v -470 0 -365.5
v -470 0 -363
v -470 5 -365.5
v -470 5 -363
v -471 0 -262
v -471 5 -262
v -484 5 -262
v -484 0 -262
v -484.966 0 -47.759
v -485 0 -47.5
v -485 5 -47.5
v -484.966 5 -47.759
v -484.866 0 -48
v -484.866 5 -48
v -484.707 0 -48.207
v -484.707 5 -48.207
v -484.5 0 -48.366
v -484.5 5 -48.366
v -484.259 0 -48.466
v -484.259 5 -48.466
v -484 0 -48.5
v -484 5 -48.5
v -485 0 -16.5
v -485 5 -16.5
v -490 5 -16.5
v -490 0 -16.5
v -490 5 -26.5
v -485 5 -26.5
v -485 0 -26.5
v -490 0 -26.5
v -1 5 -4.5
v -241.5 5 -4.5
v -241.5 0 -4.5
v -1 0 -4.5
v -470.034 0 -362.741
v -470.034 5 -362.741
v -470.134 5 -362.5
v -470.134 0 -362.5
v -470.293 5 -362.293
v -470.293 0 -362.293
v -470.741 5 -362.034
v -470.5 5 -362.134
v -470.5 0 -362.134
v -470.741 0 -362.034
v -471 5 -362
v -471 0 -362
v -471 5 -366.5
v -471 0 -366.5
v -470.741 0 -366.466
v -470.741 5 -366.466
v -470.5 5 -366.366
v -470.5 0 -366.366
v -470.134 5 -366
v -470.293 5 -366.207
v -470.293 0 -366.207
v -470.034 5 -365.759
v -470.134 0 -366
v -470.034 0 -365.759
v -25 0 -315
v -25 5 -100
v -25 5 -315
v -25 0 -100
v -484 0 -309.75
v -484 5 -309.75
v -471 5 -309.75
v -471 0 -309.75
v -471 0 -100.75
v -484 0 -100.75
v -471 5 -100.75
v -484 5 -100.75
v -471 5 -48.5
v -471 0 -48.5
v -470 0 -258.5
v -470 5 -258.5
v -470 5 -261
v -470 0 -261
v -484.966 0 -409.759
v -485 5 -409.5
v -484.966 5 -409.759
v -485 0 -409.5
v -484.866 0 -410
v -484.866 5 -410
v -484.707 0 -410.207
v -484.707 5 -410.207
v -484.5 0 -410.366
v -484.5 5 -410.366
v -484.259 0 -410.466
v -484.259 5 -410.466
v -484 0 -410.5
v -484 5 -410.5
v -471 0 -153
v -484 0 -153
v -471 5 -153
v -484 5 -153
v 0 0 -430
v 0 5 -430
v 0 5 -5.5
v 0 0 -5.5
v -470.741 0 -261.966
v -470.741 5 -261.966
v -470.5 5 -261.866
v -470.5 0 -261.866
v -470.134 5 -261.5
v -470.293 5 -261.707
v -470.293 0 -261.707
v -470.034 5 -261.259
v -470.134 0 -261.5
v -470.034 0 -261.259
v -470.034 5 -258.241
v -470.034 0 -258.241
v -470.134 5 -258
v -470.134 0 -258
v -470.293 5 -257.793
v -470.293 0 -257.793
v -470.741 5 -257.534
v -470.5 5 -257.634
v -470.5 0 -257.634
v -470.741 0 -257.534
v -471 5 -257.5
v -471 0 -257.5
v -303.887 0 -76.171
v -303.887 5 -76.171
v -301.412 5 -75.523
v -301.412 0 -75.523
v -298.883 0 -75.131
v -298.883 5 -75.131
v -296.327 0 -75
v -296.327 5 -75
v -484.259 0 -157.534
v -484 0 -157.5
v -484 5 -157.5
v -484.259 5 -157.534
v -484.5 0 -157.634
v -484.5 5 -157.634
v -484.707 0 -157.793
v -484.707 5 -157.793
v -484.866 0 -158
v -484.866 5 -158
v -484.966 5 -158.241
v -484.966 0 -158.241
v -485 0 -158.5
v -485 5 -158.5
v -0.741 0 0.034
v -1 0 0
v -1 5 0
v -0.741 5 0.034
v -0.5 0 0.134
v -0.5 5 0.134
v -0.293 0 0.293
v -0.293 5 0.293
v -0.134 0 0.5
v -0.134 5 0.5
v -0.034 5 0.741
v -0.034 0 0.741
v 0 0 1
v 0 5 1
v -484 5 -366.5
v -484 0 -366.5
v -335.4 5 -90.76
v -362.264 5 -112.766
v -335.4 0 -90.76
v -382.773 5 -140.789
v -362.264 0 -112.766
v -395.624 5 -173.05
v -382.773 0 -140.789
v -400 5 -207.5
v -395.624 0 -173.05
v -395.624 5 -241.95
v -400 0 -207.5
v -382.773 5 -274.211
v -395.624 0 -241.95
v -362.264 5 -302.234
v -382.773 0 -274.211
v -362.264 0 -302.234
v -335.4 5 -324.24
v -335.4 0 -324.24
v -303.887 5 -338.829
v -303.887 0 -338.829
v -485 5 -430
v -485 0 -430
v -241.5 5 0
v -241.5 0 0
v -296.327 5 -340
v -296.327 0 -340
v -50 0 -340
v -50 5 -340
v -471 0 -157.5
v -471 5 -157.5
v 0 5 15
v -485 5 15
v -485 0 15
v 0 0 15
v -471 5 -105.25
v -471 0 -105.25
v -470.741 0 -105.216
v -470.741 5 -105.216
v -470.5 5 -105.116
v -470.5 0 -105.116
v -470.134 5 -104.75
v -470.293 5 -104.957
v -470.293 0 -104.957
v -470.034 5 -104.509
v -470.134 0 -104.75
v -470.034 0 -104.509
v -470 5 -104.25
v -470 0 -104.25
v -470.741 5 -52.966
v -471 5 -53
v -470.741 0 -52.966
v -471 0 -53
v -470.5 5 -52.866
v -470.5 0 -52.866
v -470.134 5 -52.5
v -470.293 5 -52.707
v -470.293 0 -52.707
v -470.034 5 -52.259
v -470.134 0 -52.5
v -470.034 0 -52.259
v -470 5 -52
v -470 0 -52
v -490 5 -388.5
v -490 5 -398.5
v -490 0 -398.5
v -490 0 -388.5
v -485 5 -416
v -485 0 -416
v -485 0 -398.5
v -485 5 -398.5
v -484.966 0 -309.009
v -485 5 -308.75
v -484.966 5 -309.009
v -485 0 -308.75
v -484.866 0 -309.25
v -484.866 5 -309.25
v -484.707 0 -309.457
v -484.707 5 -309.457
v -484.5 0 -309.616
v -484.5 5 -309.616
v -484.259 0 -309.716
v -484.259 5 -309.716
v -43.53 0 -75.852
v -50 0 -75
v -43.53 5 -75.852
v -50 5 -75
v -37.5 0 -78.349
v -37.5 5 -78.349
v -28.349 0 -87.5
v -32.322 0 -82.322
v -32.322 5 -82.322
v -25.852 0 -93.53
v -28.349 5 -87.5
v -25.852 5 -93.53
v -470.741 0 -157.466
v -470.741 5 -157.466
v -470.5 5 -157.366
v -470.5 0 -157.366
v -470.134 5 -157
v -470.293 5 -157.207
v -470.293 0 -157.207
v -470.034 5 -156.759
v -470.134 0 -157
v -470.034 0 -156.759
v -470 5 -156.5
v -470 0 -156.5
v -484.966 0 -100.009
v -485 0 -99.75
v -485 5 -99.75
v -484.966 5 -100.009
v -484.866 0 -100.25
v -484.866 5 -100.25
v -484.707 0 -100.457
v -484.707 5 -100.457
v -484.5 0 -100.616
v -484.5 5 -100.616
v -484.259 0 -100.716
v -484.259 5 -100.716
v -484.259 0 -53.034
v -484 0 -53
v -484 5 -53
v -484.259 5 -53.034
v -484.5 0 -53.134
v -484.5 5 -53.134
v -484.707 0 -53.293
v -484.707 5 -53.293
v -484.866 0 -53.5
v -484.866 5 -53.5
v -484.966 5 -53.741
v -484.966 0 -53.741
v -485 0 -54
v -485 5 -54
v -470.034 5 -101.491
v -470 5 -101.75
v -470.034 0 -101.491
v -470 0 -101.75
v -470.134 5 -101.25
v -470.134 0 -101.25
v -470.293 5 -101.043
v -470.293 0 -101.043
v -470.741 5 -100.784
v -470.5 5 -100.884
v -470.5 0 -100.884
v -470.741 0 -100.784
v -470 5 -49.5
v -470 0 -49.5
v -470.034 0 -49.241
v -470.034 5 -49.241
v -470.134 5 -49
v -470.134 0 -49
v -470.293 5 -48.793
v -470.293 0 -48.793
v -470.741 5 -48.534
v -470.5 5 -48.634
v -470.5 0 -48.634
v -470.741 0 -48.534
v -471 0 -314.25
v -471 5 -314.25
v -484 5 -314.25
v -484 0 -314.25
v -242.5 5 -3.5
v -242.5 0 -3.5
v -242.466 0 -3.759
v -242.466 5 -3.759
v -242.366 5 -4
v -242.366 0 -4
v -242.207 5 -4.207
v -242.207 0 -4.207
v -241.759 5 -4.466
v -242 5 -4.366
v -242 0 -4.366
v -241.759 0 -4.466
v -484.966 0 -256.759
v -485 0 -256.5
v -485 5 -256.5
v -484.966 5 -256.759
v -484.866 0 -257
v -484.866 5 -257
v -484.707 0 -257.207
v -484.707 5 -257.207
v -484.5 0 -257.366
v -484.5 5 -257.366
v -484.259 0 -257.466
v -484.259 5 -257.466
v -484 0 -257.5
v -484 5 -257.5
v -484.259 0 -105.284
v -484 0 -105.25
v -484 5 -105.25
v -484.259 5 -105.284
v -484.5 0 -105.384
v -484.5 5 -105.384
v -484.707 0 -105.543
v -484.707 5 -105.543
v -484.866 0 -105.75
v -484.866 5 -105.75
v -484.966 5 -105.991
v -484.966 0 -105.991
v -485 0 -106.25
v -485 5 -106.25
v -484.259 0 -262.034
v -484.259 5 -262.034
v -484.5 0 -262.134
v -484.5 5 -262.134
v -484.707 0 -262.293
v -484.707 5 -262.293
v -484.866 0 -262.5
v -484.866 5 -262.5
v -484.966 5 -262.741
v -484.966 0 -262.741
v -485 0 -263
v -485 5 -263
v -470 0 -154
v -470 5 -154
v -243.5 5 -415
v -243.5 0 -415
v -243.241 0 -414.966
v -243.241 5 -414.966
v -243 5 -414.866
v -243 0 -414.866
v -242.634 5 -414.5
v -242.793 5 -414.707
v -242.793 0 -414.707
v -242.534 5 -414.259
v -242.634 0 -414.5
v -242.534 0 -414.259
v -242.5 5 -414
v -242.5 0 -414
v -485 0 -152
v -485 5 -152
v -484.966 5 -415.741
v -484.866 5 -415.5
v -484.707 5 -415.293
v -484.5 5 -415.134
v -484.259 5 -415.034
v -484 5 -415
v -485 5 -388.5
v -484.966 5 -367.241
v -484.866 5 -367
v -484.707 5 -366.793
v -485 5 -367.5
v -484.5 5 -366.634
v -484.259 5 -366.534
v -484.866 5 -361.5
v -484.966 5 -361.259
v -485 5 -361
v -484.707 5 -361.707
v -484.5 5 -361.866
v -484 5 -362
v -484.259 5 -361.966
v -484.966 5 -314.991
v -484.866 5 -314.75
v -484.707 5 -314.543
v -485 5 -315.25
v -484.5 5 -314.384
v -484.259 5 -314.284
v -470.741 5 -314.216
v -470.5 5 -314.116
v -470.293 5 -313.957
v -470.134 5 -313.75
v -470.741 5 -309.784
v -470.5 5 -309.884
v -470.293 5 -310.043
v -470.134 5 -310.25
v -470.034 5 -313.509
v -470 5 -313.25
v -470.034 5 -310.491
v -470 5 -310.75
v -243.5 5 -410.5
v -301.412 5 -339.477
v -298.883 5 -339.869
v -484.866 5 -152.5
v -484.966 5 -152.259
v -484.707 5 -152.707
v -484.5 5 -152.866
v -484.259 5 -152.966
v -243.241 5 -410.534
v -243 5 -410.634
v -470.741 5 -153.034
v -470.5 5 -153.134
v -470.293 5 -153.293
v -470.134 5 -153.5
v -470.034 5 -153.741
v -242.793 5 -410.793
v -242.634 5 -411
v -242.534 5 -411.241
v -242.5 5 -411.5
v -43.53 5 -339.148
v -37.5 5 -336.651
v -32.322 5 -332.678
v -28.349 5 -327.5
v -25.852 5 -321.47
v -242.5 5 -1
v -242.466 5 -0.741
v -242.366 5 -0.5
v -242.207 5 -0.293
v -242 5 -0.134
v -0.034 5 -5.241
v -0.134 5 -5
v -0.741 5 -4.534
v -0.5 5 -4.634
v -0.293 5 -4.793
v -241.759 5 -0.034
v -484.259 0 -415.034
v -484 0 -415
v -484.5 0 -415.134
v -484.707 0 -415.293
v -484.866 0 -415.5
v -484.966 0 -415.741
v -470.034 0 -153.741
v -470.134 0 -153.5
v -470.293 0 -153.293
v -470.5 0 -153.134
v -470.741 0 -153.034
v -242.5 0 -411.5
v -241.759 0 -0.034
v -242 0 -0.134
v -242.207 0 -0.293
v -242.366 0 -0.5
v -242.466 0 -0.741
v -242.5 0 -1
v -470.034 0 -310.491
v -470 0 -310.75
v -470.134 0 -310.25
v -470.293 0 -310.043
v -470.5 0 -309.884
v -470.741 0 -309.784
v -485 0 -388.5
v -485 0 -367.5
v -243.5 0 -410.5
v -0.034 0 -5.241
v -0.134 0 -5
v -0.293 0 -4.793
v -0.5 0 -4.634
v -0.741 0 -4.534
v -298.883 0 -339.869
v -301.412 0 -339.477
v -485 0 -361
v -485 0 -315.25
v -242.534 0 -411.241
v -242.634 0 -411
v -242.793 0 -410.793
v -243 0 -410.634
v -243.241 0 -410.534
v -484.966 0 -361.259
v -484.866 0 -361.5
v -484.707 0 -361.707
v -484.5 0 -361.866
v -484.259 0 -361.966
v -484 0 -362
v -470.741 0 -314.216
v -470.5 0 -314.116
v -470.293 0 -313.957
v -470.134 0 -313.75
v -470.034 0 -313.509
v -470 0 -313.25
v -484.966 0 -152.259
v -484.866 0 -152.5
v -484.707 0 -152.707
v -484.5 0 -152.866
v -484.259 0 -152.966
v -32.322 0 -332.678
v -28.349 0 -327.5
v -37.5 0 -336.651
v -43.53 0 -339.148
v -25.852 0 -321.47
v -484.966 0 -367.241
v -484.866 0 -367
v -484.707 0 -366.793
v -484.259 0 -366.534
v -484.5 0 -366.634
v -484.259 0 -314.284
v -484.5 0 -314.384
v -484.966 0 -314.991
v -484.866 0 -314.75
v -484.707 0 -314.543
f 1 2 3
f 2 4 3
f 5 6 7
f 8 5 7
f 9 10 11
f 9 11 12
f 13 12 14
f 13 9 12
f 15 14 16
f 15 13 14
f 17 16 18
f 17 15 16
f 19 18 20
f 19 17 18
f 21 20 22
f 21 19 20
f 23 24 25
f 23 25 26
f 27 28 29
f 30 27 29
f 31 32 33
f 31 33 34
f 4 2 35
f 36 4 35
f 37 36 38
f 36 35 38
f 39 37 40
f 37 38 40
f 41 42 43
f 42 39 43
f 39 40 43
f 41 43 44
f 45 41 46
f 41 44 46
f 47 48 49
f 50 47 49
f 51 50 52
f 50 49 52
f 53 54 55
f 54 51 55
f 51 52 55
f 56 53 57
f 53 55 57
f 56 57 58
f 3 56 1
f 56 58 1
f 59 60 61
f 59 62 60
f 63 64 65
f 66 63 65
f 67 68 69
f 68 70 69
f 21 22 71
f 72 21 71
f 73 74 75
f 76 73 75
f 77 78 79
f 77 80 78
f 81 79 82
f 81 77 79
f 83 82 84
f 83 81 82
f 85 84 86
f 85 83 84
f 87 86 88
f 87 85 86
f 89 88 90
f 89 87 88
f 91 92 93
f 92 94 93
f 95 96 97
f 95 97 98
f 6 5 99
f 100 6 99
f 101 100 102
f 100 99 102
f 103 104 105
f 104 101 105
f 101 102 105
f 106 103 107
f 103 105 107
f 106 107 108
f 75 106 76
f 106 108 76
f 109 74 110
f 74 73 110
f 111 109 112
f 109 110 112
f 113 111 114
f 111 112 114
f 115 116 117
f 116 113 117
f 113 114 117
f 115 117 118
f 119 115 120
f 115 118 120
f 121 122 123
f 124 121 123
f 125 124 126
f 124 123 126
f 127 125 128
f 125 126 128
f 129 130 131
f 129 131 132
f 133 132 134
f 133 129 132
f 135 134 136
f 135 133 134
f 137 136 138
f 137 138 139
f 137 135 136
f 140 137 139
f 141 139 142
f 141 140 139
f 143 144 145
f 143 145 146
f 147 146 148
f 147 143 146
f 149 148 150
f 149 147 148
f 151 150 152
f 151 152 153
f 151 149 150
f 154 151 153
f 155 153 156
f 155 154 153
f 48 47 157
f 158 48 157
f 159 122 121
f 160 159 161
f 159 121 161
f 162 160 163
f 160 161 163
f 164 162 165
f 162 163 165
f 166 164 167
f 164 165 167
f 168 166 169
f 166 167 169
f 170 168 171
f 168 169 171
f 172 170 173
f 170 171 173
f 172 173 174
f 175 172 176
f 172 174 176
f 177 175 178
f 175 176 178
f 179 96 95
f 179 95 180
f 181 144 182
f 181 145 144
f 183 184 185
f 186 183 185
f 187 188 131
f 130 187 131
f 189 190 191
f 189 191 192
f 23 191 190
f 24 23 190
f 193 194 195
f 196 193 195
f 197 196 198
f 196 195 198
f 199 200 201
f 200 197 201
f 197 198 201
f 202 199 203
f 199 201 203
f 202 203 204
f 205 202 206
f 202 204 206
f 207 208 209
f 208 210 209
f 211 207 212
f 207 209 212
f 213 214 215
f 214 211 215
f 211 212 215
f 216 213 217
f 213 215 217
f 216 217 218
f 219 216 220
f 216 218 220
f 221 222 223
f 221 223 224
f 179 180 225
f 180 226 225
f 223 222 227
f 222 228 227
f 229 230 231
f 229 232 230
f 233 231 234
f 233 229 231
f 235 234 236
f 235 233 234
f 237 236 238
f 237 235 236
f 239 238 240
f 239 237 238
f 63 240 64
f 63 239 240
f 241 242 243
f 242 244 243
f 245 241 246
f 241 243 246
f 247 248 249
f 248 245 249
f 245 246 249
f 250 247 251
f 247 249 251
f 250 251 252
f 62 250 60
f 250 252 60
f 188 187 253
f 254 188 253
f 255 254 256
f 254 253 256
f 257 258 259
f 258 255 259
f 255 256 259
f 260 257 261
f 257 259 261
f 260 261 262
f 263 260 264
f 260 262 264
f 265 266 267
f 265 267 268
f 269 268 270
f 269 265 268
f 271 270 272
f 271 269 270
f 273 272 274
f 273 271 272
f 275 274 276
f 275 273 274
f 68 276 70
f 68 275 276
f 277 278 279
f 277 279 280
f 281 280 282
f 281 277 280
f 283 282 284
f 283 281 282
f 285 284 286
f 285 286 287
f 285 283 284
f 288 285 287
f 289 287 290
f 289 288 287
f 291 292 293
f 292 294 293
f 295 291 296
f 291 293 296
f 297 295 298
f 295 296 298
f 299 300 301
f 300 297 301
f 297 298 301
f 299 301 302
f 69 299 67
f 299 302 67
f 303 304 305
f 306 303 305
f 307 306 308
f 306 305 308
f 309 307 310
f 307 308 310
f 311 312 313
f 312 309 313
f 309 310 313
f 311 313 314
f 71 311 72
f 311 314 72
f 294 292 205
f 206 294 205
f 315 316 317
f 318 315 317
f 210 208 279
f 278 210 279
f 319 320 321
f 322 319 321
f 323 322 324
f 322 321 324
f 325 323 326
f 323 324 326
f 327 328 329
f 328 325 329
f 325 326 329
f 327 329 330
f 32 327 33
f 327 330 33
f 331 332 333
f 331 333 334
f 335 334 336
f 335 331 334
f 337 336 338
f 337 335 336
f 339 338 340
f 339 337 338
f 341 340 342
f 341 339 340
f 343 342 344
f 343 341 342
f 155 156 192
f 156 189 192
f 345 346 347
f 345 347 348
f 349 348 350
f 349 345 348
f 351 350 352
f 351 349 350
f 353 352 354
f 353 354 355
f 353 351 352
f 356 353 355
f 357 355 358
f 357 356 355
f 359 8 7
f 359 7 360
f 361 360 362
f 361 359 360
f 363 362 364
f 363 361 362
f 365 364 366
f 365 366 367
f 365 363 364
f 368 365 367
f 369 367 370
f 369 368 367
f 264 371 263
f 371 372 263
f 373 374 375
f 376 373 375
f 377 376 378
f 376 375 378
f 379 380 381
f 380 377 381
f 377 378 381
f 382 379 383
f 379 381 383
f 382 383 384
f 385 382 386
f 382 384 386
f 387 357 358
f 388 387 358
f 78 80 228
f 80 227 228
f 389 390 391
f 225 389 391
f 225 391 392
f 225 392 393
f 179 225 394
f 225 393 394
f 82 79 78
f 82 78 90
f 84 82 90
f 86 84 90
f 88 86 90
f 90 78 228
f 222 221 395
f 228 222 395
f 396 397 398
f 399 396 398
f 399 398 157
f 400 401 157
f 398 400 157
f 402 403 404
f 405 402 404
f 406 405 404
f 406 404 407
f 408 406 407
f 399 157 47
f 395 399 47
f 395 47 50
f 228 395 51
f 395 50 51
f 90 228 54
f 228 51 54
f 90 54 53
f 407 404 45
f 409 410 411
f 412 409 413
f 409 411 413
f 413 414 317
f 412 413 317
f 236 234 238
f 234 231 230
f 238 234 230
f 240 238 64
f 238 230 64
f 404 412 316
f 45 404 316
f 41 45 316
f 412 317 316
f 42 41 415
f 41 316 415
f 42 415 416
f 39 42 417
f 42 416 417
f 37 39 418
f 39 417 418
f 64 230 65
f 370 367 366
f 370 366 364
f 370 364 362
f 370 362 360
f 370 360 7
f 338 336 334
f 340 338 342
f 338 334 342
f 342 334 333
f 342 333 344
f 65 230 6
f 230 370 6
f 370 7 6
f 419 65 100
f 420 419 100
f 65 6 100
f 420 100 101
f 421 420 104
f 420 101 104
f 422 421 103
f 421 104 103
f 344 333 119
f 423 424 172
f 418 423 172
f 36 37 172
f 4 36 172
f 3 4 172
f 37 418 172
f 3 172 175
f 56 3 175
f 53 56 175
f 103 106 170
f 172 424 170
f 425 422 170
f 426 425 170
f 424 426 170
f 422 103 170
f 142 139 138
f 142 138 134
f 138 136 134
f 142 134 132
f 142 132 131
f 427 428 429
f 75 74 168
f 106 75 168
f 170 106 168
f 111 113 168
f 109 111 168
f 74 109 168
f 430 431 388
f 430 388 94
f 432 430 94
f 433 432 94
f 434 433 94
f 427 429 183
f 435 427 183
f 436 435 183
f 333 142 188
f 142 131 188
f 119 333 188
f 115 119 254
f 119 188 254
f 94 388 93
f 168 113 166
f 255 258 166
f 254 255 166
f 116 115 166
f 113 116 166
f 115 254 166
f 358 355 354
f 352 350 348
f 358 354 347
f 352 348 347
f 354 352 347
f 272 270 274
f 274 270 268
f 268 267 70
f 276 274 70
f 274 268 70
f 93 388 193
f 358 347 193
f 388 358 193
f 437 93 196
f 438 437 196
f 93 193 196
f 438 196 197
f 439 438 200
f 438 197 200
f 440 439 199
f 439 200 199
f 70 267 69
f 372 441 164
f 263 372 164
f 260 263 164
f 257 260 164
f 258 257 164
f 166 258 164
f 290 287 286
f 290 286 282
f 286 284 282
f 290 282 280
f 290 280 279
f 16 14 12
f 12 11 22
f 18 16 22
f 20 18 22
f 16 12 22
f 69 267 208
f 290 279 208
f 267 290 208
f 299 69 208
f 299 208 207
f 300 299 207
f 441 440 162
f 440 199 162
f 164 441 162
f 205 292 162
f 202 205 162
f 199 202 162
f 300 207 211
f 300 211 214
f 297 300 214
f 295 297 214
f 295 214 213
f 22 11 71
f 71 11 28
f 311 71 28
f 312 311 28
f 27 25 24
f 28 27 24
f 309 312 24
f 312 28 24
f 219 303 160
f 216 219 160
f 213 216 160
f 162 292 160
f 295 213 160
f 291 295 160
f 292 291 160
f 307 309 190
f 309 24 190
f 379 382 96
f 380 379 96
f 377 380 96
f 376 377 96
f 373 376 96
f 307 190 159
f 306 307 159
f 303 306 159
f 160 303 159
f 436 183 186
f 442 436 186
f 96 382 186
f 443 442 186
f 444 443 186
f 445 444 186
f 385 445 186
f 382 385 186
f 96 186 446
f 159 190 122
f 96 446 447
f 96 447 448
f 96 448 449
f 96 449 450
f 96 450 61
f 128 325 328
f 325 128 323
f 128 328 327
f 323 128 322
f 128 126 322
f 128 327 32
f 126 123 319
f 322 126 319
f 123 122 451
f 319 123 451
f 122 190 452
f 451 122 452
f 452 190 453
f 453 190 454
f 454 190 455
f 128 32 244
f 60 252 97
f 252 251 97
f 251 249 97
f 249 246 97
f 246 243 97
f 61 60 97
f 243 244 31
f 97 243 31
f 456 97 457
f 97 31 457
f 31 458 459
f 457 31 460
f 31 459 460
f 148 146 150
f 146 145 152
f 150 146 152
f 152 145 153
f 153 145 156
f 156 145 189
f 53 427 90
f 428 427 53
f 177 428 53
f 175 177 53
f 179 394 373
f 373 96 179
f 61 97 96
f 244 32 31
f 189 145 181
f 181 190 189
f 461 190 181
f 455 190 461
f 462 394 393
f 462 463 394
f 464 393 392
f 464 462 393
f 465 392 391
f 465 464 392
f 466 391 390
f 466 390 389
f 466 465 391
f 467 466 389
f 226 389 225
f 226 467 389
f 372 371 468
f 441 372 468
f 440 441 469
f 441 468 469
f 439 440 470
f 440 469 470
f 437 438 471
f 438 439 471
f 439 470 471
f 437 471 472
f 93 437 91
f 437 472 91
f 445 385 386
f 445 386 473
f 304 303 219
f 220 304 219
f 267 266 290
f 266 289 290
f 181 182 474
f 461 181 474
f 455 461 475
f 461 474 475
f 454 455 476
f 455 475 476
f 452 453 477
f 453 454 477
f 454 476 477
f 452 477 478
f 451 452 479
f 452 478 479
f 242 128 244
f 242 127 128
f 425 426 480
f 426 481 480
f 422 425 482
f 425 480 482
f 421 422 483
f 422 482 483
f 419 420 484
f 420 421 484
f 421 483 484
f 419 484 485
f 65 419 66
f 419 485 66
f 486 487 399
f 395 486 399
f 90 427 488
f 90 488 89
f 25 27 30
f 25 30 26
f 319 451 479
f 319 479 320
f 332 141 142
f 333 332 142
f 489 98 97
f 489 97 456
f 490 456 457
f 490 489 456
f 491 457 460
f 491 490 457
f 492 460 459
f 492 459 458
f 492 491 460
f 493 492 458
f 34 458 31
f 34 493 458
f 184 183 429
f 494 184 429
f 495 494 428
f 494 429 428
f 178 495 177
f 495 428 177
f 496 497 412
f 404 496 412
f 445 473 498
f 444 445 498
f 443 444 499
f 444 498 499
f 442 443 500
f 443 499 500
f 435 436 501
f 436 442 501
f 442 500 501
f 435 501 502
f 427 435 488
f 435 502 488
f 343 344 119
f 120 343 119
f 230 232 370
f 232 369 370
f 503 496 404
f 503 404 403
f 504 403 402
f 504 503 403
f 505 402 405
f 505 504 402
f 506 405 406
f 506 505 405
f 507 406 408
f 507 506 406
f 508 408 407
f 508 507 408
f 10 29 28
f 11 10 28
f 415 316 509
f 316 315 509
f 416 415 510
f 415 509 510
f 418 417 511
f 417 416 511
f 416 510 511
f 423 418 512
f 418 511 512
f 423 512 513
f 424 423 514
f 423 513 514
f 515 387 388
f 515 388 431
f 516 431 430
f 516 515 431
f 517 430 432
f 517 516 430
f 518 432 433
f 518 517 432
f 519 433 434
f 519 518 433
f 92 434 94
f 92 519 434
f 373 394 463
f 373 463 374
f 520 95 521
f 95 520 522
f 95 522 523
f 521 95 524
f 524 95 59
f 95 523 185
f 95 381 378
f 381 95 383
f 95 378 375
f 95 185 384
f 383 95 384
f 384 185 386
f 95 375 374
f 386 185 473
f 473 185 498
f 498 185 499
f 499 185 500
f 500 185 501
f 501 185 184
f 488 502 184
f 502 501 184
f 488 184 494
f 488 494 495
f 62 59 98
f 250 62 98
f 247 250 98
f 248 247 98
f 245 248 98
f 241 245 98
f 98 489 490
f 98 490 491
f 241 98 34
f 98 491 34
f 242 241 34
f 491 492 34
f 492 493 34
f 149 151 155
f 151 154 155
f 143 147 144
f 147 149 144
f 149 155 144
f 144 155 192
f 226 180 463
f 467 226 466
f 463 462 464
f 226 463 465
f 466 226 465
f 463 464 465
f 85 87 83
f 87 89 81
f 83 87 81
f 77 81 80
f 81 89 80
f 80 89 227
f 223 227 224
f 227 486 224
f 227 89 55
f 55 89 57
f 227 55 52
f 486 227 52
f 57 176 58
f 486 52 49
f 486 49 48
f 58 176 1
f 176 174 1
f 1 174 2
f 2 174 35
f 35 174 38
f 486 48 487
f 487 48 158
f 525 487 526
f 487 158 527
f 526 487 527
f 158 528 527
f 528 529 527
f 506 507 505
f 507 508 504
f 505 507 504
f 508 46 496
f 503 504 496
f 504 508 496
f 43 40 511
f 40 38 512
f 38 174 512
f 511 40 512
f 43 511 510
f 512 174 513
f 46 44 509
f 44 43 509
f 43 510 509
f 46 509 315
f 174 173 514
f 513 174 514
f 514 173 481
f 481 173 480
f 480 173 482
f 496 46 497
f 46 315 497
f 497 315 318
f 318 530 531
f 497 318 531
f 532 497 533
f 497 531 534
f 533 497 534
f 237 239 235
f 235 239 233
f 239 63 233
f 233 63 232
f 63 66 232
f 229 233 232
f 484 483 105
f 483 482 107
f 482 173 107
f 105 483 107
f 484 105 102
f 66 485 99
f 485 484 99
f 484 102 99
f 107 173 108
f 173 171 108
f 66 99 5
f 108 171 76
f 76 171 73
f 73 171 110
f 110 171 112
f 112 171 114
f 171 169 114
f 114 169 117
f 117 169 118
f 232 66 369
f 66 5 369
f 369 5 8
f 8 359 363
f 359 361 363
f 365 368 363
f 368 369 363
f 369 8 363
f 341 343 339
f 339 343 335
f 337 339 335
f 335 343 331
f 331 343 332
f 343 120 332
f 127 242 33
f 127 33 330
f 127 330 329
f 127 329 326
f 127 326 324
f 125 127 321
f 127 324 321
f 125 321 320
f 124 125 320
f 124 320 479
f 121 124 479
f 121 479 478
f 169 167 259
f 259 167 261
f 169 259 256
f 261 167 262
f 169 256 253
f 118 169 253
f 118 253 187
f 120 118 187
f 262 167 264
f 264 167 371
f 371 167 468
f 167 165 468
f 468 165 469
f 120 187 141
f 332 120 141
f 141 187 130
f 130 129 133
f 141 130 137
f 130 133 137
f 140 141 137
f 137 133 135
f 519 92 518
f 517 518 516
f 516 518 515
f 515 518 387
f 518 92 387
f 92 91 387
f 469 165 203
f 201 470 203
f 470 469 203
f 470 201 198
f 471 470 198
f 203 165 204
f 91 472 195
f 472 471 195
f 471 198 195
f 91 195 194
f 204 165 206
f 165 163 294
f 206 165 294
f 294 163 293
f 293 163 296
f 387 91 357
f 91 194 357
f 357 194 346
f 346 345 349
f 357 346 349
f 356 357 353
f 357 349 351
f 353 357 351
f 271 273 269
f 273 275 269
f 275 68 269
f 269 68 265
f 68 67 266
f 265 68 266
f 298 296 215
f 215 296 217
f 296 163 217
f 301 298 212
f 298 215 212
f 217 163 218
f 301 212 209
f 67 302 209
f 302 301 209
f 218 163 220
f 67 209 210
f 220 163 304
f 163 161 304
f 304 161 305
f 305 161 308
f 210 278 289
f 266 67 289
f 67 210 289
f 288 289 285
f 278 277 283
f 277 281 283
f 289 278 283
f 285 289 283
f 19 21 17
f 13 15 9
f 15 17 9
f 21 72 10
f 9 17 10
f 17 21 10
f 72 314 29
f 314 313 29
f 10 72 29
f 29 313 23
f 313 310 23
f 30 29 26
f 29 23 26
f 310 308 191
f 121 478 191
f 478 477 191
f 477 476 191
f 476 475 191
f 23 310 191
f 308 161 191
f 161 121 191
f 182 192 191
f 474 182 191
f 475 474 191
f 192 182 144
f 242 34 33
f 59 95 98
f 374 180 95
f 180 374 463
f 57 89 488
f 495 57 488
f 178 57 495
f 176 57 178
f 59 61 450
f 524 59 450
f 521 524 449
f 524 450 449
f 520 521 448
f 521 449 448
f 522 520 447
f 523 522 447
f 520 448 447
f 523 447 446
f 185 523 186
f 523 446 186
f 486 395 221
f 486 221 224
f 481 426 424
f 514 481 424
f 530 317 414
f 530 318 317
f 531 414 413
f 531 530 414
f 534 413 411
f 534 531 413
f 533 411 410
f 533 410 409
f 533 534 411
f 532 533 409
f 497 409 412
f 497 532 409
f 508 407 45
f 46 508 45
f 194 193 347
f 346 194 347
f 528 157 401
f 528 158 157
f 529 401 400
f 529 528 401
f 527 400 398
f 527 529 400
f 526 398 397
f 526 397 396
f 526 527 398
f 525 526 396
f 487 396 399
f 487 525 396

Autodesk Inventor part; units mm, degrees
ref_plane "YZ Plane" through (0, 0, 0) normal (1, 0, 0) x (0, 1, 0)
ref_plane "XZ Plane" through (0, 0, 0) normal (0, 1, 0) x (-1, 0, 0)
ref_plane "XY Plane" through (0, 0, 0) normal (0, 0, 1) x (1, 0, 0)
sketch "Sketch1" plane through (0, 0, 0) normal (0, 1, 0) x (-1, 0, 0)
  line L0 (0, 0) -> (485, 0)
  line L1 (485, 0) -> (485, -415)
  line L2 (485, -415) -> (0, -415)
  line L3 (0, -415) -> (0, 0)
  line L4 (0, 0) -> (25, 0)
  line L5 (25, 0) -> (25, -415)
  line L6 (25, -415) -> (0, -415)
  line L7 (0, -415) -> (0, 0)
  line L8 (25, 0) -> (300, 0)
  line L9 (300, 0) -> (300, -75)
  line L10 (300, -75) -> (25, -75)
  line L11 (25, -75) -> (25, 0)
  line L12 (25, -415) -> (300, -415)
  line L13 (300, -415) -> (300, -340)
  line L14 (300, -340) -> (25, -340)
  line L15 (25, -340) -> (25, -415)
  line L16 (25, -207.5) -> (400, -207.5)
  arc A0 (300, -340) -> (300, -75) centre (262.2188, -207.5) ccw
  point P0 (25, -340)
  point P1 (25, -75)
  dimension "d0" = 485
  dimension "d1" = 415
  dimension "d2" = 25
  dimension "d3" = 275
  dimension "d4" = 75
  dimension "d5" = 275
  dimension "d6" = 75
  dimension "d7" = 375
extrude "Extrusion1" add sketch "Sketch1" along normal blind 5 contours L0 L5 L2 L3 | L0 L9 L10 L5 | L0 L1 L2 L13 A0 L9 | L5 L14 L13 L2
fillet "Fillet1" radius 25 4 edges at (-25, 2.5, -340) (-25, 2.5, -75) (-300, 2.5, -75) (-300, 2.5, -340)
sketch "Sketch2" plane through (-485, 0, 0) normal (0, 0, 1) x (1, 0, 0)
  line L0 (0, 0) -> (485, 0) projected
  line L1 (0, 5) -> (485, 5) projected
  line L2 (0, 0) -> (485, 0)
  line L3 (485, 0) -> (485, 5)
  line L4 (485, 5) -> (0, 5)
  line L5 (0, 5) -> (0, 0)
extrude "Extrusion2" add sketch "Sketch2" along normal blind 10
sketch "Sketch3" plane through (0, 0, -415) normal (0, 0, -1) x (-1, 0, 0)
  line L0 (485, 0) -> (485, 5) projected
  line L1 (485, 5) -> (0, 5)
  line L2 (0, 5) -> (0, 0)
  line L3 (0, 0) -> (485, 0)
  line L4 (485, 0) -> (485, 5)
extrude "Extrusion3" add sketch "Sketch3" along normal blind 10
sketch "Sketch4" plane through (0, 5, 0) normal (0, 1, 0) x (1, 0, 0)
  line L0 (0, 0) -> (-242.5, 0)
  line L1 (-242.5, 0) -> (-242.5, 4.5)
  line L2 (-242.5, 4.5) -> (0, 4.5)
  line L3 (0, 4.5) -> (0, 0)
  line L4 (-485, -10) -> (-485, 425) projected
  line L5 (-485, 425) -> (-485, 415)
  line L6 (-485, 415) -> (-242.5, 415)
  line L7 (-242.5, 415) -> (-242.5, 410.5)
  line L8 (-242.5, 410.5) -> (-485, 410.5)
  line L9 (-485, 410.5) -> (-485, 415)
  line L10 (0, 425) -> (0, -10) projected
  dimension "d15" = 4.5
  dimension "d16" = 4.5
  dimension "d17" = 242.5
  dimension "d18" = 10
  dimension "d19" = 4.5
  dimension "d20" = 242.5
extrude "Extrusion4" cut sketch "Sketch4" against normal blind 5
sketch "Sketch6" plane through (0, 5, 0) normal (0, 1, 0) x (1, 0, 0)
  line L0 (-485, 410.5) -> (-485, 202.5446)
  line L1 (-485, 410.5) -> (-485, 362)
  line L2 (-485, 362) -> (-470, 362)
  line L3 (-470, 362) -> (-470, 366.5)
  line L4 (-470, 366.5) -> (-485, 366.5)
  line L5 (-485, 366.5) -> (-485, 362)
  line L6 (-485, 309.75) -> (-470, 309.75)
  line L7 (-470, 309.75) -> (-470, 314.25)
  line L8 (-470, 314.25) -> (-485, 314.25)
  line L9 (-485, 314.25) -> (-485, 309.75)
  line L10 (-485, 257.5) -> (-470, 257.5)
  line L11 (-470, 257.5) -> (-470, 262)
  line L12 (-470, 262) -> (-485, 262)
  line L13 (-485, 262) -> (-485, 257.5)
  line L14 (-485, 205.25) -> (-470, 205.25)
  line L15 (-470, 205.25) -> (-470, 209.75)
  line L16 (-470, 209.75) -> (-485, 209.75)
  line L17 (-485, 209.75) -> (-485, 205.25)
  line L18 (-485, 153) -> (-470, 153)
  line L19 (-470, 153) -> (-470, 157.5)
  line L20 (-470, 157.5) -> (-485, 157.5)
  line L21 (-485, 157.5) -> (-485, 153)
  line L22 (-485, 100.75) -> (-470, 100.75)
  line L23 (-470, 100.75) -> (-470, 105.25)
  line L24 (-470, 105.25) -> (-485, 105.25)
  line L25 (-485, 105.25) -> (-485, 100.75)
  line L26 (-485, 48.5) -> (-470, 48.5)
  line L27 (-470, 48.5) -> (-470, 53)
  line L28 (-470, 53) -> (-485, 53)
  line L29 (-485, 53) -> (-485, 48.5)
  line L30 (-485, -10) -> (-485, 410.5) projected
  line L31 (-485, 410.5) -> (-452.1188, 410.5)
  line L32 (-242.5, 410.5) -> (-485, 410.5) projected
  point P0 (0, 0)
  dimension "d27" = 48.5
  dimension "d28" = 15
  dimension "d29" = 4.5
  dimension "d30" = 52.25
  dimension "d32" = 0
extrude "Extrusion5" cut sketch "Sketch6" against normal blind 5 contours L4 L3 L2 L0 | L28 L27 L26 L29 | L24 L23 L22 L25 | L20 L19 L18 L21 | L12 L11 L10 L0 | L8 L7 L6 L0
ref_plane "Work Plane1" through (0, 5, -430.1373) normal (0, 0, -1) x (-1, 0, 0)
fillet "Fillet2" radius 1 32 edges at (-242.5, 2.5, 0) (-242.5, 2.5, -4.5) (0, 2.5, 0) (0, 2.5, -4.5) (-470, 2.5, -48.5) (-470, 2.5, -53) (-485, 2.5, -53) (-485, 2.5, -48.5) (-470, 2.5, -100.75) (-470, 2.5, -105.25) (-485, 2.5, -105.25) (-485, 2.5, -100.75) (-485, 2.5, -157.5) (-485, 2.5, -153) (-470, 2.5, -153) (-470, 2.5, -157.5) (-485, 2.5, -257.5) (-470, 2.5, -257.5) (-470, 2.5, -262) (-485, 2.5, -262) (-470, 2.5, -309.75) (-470, 2.5, -314.25) (-485, 2.5, -314.25) (-485, 2.5, -309.75) (-485, 2.5, -366.5) (-485, 2.5, -362) (-470, 2.5, -362) (-470, 2.5, -366.5) (-485, 2.5, -410.5) (-485, 2.5, -415) (-242.5, 2.5, -410.5) (-242.5, 2.5, -415)
sketch "Sketch10" plane through (-485, 0, -409.5) normal (-1, 0, 0) x (0, 0, 1)
  line L0 (42, 5) -> (0, 5) projected
  line L1 (21, 5) -> (21, 0)
  line L2 (21, 0) -> (11, 0)
  line L3 (0, 0) -> (42, 0) projected
  line L4 (11, 0) -> (31, 0)
  line L5 (31, 0) -> (31, 5)
  line L6 (31, 5) -> (11, 5)
  line L7 (11, 5) -> (11, 0)
  line L8 (70.6707, 5) -> (333.3293, 5) projected
  line L9 (202, 5) -> (202, -36.8909)
  line L10 (383, 5) -> (383, 0)
  line L11 (383, 0) -> (393, 0)
  line L12 (393, 0) -> (373, 0)
  line L13 (373, 0) -> (373, 5)
  line L14 (373, 5) -> (393, 5)
  line L15 (393, 5) -> (393, 0)
  point P0 (409.5, 0)
  point P1 (31, 0)
  point P2 (11, 5)
  dimension "d44" = 10
  dimension "d45" = 20
extrude "Extrusion9" add sketch "Sketch10" along normal blind 5 contours L1 L2 L7 L0 | L14 L15 L11 L10
sketch "Sketch12" plane through (0, 5, 0) normal (0, 1, 0) x (1, 0, 0)
  line L0 (0, -10) -> (-485, -10)
  line L1 (-485, -10) -> (-485, -15)
  line L2 (-485, -15) -> (0, -15)
  line L3 (0, -15) -> (0, -10)
  line L4 (0, 425) -> (-485, 425) projected
  line L5 (-485, 425) -> (0, 425)
  line L6 (0, 425) -> (0, 430)
  line L7 (0, 430) -> (-485, 430)
  line L8 (-485, 430) -> (-485, 425)
  point P0 (0, 0)
  dimension "d48" = 5
  dimension "d49" = 5
extrude "Extrusion10" add sketch "Sketch12" against normal blind 5
properties part number "outside_leg" material "Foam Core Board"
